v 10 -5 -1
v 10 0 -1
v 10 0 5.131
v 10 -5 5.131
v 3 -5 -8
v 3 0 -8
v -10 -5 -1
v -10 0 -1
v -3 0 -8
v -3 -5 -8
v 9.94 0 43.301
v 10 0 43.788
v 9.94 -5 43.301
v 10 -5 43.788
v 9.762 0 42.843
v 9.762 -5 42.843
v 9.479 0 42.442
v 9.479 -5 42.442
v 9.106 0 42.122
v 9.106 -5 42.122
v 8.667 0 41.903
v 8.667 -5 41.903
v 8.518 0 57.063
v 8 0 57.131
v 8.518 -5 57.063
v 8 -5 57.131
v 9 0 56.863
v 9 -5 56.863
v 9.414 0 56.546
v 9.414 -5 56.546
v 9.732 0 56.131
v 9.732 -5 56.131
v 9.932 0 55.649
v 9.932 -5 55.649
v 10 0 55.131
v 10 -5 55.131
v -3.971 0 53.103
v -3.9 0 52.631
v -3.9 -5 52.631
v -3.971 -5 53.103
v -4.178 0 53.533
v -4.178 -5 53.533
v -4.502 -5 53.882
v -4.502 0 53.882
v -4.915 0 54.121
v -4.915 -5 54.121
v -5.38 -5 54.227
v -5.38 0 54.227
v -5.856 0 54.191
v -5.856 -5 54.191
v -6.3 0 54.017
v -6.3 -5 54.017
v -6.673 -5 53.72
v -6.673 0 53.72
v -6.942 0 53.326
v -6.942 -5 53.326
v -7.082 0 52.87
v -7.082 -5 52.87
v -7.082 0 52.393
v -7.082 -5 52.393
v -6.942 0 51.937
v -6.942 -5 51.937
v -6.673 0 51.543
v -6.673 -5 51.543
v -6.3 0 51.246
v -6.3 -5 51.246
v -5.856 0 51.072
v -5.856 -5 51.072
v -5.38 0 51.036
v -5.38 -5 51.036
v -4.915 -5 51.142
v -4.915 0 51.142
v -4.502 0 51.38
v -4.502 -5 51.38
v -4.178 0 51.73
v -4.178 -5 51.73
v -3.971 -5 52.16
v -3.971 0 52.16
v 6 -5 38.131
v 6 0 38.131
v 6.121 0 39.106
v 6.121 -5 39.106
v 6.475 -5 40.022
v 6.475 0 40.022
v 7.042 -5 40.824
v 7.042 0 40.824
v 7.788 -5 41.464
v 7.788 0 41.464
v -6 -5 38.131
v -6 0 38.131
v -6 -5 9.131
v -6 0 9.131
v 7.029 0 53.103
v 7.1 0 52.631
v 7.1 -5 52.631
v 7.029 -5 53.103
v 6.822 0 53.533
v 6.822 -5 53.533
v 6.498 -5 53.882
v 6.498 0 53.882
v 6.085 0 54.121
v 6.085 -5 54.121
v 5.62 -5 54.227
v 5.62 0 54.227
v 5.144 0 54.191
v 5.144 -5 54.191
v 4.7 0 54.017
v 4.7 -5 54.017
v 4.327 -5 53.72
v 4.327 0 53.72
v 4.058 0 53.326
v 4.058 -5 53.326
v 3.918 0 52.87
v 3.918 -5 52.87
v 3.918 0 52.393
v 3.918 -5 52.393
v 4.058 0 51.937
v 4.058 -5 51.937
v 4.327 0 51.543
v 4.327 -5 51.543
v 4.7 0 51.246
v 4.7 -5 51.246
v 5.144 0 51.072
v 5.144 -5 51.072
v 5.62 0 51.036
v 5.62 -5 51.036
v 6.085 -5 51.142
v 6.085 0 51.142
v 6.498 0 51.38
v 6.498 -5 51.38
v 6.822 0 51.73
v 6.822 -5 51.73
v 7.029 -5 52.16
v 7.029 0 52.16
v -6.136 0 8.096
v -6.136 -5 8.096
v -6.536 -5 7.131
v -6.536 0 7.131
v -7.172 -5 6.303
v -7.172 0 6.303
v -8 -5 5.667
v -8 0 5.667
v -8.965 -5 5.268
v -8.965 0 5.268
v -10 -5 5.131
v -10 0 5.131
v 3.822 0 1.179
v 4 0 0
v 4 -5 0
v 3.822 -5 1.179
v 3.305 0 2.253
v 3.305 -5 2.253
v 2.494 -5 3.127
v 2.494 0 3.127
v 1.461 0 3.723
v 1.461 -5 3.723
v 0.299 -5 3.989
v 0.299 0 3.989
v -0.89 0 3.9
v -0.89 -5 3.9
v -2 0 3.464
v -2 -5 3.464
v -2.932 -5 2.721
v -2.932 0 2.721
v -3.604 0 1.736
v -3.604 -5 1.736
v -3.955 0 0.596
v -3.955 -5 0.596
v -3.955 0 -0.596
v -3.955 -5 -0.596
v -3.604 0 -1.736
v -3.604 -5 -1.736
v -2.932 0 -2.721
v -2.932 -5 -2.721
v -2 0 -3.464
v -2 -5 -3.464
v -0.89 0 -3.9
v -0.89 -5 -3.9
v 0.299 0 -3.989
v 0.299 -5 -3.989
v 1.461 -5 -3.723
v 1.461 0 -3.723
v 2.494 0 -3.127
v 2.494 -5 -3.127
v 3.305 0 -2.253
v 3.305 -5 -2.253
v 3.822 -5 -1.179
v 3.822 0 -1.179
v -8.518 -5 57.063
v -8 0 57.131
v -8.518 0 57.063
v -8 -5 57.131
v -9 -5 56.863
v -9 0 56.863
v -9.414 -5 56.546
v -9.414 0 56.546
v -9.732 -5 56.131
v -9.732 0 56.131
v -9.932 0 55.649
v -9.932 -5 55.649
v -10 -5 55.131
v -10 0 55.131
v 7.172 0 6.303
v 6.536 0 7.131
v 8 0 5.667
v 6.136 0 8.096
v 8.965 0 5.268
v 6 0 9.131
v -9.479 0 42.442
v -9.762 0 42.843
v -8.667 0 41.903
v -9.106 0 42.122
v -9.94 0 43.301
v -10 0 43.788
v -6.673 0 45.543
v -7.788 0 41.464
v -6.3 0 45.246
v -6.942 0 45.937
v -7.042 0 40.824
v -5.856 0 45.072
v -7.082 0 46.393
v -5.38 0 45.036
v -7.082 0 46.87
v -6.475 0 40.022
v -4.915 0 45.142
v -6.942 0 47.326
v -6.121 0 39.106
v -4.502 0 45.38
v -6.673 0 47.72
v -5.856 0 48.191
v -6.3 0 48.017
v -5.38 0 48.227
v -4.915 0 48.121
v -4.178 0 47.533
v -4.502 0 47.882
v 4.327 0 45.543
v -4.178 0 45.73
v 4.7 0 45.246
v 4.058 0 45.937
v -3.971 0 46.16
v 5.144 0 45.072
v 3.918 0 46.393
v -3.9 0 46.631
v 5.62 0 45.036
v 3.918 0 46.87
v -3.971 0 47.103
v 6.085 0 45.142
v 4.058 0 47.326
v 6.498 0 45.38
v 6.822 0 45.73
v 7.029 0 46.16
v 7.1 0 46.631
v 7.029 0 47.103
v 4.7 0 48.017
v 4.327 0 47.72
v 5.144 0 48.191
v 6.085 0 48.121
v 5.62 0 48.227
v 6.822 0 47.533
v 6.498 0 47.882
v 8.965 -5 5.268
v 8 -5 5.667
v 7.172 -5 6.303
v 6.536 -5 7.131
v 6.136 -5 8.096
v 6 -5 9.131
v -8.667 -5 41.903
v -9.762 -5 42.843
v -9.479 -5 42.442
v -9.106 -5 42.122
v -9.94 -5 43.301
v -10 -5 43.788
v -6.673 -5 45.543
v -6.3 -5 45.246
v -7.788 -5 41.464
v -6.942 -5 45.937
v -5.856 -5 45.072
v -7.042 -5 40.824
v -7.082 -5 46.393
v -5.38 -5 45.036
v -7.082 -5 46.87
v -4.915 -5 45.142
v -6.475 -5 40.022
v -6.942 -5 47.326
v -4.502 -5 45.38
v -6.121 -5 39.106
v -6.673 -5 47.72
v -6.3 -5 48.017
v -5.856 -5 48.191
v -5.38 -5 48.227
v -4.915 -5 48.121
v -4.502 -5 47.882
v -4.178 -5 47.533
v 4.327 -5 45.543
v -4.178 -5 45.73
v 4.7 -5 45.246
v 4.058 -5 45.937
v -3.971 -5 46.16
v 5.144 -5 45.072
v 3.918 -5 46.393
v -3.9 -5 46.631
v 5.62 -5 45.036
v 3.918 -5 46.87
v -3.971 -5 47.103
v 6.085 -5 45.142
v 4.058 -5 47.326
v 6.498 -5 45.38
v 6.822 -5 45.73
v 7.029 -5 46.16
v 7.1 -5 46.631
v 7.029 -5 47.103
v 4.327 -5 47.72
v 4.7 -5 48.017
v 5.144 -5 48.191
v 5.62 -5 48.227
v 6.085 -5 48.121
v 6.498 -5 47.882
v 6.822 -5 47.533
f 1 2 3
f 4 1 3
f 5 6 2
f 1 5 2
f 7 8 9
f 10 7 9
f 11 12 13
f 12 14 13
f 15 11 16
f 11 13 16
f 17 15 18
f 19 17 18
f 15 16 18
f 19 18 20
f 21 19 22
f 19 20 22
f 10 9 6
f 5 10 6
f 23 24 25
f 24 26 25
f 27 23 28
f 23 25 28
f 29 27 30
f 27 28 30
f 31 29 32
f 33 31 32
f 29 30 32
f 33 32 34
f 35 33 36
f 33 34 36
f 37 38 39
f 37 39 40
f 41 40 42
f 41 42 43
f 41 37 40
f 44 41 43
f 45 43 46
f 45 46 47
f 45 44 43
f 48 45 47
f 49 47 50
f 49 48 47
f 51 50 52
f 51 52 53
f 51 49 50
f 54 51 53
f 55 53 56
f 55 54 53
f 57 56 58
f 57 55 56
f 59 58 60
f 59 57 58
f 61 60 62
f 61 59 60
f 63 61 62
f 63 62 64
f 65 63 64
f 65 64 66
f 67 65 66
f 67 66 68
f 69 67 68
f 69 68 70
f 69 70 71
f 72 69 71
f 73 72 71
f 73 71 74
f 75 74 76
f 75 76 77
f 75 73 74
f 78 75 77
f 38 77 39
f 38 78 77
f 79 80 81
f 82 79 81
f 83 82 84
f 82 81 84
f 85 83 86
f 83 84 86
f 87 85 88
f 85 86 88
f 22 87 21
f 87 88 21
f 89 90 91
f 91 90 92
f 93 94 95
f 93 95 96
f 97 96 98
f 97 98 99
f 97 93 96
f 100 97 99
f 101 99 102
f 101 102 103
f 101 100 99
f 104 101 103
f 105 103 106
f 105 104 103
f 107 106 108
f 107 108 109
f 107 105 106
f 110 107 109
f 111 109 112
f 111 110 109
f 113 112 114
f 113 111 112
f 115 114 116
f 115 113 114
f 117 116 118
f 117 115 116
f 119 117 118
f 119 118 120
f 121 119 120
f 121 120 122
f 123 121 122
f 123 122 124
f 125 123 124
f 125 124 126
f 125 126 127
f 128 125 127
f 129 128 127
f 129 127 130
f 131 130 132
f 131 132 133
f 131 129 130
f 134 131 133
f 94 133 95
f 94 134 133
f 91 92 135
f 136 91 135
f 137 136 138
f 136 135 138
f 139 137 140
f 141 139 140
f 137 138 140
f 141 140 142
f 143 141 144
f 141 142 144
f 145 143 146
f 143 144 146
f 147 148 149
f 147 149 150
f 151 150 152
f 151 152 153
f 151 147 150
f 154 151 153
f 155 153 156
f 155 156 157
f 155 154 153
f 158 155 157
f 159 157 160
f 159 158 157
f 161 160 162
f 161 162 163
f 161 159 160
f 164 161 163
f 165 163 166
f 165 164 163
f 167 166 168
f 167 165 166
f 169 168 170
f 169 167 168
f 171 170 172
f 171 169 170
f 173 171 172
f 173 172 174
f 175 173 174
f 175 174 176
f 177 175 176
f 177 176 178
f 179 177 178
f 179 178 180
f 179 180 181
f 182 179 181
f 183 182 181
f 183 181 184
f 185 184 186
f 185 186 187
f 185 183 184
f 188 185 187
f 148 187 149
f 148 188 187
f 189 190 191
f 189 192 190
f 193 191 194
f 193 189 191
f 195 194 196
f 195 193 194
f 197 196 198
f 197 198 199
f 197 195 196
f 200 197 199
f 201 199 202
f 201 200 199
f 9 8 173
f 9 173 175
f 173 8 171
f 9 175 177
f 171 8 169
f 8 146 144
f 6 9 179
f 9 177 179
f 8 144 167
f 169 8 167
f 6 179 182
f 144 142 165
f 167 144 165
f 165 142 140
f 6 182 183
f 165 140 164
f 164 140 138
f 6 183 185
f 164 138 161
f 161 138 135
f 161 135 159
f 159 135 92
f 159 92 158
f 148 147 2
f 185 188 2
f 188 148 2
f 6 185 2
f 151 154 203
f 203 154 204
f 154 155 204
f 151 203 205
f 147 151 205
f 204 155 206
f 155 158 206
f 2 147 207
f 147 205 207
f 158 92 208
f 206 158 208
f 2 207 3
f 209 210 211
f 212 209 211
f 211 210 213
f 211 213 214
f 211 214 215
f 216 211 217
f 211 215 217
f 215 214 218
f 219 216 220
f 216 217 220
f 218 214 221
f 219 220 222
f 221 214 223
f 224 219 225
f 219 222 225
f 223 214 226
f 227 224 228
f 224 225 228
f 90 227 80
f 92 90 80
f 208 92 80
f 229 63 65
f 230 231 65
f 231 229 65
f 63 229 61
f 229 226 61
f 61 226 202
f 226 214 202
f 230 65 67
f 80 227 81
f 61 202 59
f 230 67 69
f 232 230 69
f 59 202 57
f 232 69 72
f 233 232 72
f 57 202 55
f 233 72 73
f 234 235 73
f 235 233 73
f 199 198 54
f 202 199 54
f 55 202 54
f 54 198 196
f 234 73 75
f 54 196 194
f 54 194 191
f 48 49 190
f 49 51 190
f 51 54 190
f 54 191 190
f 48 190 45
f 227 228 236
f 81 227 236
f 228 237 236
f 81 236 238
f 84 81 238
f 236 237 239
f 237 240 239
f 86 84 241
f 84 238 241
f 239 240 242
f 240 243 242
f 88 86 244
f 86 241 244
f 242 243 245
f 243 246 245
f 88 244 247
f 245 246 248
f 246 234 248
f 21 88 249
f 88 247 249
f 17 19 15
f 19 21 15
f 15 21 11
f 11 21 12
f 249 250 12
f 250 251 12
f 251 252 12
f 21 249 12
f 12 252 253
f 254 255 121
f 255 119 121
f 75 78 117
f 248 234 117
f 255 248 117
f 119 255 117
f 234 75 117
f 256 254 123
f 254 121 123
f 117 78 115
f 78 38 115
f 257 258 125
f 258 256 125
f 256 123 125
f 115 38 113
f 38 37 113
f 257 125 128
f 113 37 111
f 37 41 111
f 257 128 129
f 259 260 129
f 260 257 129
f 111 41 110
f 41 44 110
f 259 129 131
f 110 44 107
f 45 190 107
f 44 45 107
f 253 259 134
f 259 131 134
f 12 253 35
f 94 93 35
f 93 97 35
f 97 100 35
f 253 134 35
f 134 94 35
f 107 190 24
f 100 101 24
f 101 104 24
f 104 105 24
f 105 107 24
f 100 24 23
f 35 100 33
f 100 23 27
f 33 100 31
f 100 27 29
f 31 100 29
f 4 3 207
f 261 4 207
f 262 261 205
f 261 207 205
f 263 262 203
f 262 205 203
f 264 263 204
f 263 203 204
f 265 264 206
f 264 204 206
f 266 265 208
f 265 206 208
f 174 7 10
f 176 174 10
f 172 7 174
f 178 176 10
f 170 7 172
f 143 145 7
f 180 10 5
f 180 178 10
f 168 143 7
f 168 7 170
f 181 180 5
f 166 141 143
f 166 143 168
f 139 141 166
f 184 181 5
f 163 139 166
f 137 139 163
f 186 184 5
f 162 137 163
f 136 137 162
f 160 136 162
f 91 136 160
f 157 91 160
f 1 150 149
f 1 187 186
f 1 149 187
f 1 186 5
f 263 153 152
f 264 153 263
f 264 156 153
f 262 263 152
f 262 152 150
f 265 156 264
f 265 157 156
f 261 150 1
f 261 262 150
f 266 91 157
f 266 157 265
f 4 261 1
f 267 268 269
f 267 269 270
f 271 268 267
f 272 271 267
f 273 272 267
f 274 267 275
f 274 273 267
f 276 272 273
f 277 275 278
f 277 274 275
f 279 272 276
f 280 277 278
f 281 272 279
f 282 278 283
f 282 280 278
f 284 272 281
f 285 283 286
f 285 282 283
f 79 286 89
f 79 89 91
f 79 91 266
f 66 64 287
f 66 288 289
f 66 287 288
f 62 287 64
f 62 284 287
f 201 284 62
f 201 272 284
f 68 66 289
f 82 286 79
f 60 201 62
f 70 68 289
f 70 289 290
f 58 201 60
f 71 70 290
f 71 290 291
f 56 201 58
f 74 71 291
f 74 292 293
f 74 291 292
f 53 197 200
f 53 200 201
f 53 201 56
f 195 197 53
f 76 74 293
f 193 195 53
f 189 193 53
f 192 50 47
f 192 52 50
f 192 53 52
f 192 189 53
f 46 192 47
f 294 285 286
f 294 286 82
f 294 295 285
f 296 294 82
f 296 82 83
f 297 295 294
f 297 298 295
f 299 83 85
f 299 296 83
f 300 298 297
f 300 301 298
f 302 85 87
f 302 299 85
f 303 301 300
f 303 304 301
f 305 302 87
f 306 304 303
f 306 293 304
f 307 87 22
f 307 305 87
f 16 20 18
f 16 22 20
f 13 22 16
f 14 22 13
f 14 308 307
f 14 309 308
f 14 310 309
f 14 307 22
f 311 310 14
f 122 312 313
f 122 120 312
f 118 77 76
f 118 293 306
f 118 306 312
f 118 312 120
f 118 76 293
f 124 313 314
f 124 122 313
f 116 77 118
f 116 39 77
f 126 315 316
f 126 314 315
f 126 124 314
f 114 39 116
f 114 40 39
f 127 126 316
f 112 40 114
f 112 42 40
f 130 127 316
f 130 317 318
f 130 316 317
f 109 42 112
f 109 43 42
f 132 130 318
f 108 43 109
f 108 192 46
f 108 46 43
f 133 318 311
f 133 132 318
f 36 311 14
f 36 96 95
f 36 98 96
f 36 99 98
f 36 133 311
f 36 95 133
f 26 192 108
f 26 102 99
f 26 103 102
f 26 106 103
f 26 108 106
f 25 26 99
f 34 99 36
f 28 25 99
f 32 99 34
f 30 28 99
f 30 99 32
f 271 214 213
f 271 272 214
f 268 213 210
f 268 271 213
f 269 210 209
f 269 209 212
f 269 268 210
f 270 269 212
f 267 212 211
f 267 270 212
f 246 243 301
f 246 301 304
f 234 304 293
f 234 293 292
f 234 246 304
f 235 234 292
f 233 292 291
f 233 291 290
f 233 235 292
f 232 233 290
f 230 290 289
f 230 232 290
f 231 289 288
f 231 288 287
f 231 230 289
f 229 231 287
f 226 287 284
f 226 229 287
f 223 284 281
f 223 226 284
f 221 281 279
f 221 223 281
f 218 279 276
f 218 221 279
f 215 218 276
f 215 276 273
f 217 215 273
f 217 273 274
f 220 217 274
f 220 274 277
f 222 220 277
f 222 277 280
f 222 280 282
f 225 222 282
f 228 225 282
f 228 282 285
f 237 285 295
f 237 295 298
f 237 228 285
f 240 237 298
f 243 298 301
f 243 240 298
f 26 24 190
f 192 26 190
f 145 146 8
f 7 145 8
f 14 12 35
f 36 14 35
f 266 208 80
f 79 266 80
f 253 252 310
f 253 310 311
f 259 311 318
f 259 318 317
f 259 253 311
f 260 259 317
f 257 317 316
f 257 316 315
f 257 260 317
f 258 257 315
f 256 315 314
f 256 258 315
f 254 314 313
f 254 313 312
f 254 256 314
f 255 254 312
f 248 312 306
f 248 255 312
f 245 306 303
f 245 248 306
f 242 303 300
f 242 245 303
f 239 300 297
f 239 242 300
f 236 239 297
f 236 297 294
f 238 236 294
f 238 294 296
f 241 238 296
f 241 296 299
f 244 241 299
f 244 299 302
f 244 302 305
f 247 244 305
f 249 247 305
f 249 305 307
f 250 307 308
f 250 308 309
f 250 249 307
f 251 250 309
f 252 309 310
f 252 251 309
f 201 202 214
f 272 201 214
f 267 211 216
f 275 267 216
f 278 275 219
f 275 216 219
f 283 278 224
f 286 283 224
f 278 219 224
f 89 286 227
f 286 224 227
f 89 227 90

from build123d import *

# Parameters (mm, degrees)
F0_R     = 4
F0_R_2   = 1.6
F1_DEPTH = 5
F2_R     = 2


with BuildPart() as f1:
    # F0 (on Front) → F1 (new body)
    with BuildSketch(Plane.XZ):
        with BuildLine():
            Line((10, 57.131427), (-10, 57.131427))
            Line((-10, 57.131427), (-10, 42.131427))
            ThreePointArc((-10, 42.131427), (-7.171573, 40.959855), (-6, 38.131427))
            Line((-6, 38.131427), (-6, 9.131427))
            ThreePointArc((-6, 9.131427), (-7.171573, 6.303), (-10, 5.131427))
            Line((-10, 5.131427), (-10, -1))
            Line((-10, -1), (-3, -8))
            Line((-3, -8), (3, -8))
            Line((3, -8), (10, -1))
            Line((10, -1), (10, 5.131427))
            ThreePointArc((10, 5.131427), (7.171573, 6.303), (6, 9.131427))
            Line((6, 9.131427), (6, 38.131427))
            ThreePointArc((6, 38.131427), (7.171573, 40.959855), (10, 42.131427))
            Line((10, 42.131427), (10, 57.131427))
        make_face()
        Circle(F0_R, mode=Mode.SUBTRACT)
        with Locations((-5.5, 46.631427)):
            Circle(F0_R_2, mode=Mode.SUBTRACT)
        with Locations((-5.5, 52.631427)):
            Circle(F0_R_2, mode=Mode.SUBTRACT)
        with Locations((5.5, 46.631427)):
            Circle(F0_R_2, mode=Mode.SUBTRACT)
        with Locations((5.5, 52.631427)):
            Circle(F0_R_2, mode=Mode.SUBTRACT)
    extrude(amount=F1_DEPTH)

    # F2
    f2_edges = [f1.edges().sort_by_distance(p)[0] for p in [
        (10, -2.5, 57.131427),
        (10, -2.5, 42.131427),
        (-10, -2.5, 42.131427),
        (-10, -2.5, 57.131427),
    ]]
    fillet(f2_edges, radius=F2_R)


solid = f1.part
